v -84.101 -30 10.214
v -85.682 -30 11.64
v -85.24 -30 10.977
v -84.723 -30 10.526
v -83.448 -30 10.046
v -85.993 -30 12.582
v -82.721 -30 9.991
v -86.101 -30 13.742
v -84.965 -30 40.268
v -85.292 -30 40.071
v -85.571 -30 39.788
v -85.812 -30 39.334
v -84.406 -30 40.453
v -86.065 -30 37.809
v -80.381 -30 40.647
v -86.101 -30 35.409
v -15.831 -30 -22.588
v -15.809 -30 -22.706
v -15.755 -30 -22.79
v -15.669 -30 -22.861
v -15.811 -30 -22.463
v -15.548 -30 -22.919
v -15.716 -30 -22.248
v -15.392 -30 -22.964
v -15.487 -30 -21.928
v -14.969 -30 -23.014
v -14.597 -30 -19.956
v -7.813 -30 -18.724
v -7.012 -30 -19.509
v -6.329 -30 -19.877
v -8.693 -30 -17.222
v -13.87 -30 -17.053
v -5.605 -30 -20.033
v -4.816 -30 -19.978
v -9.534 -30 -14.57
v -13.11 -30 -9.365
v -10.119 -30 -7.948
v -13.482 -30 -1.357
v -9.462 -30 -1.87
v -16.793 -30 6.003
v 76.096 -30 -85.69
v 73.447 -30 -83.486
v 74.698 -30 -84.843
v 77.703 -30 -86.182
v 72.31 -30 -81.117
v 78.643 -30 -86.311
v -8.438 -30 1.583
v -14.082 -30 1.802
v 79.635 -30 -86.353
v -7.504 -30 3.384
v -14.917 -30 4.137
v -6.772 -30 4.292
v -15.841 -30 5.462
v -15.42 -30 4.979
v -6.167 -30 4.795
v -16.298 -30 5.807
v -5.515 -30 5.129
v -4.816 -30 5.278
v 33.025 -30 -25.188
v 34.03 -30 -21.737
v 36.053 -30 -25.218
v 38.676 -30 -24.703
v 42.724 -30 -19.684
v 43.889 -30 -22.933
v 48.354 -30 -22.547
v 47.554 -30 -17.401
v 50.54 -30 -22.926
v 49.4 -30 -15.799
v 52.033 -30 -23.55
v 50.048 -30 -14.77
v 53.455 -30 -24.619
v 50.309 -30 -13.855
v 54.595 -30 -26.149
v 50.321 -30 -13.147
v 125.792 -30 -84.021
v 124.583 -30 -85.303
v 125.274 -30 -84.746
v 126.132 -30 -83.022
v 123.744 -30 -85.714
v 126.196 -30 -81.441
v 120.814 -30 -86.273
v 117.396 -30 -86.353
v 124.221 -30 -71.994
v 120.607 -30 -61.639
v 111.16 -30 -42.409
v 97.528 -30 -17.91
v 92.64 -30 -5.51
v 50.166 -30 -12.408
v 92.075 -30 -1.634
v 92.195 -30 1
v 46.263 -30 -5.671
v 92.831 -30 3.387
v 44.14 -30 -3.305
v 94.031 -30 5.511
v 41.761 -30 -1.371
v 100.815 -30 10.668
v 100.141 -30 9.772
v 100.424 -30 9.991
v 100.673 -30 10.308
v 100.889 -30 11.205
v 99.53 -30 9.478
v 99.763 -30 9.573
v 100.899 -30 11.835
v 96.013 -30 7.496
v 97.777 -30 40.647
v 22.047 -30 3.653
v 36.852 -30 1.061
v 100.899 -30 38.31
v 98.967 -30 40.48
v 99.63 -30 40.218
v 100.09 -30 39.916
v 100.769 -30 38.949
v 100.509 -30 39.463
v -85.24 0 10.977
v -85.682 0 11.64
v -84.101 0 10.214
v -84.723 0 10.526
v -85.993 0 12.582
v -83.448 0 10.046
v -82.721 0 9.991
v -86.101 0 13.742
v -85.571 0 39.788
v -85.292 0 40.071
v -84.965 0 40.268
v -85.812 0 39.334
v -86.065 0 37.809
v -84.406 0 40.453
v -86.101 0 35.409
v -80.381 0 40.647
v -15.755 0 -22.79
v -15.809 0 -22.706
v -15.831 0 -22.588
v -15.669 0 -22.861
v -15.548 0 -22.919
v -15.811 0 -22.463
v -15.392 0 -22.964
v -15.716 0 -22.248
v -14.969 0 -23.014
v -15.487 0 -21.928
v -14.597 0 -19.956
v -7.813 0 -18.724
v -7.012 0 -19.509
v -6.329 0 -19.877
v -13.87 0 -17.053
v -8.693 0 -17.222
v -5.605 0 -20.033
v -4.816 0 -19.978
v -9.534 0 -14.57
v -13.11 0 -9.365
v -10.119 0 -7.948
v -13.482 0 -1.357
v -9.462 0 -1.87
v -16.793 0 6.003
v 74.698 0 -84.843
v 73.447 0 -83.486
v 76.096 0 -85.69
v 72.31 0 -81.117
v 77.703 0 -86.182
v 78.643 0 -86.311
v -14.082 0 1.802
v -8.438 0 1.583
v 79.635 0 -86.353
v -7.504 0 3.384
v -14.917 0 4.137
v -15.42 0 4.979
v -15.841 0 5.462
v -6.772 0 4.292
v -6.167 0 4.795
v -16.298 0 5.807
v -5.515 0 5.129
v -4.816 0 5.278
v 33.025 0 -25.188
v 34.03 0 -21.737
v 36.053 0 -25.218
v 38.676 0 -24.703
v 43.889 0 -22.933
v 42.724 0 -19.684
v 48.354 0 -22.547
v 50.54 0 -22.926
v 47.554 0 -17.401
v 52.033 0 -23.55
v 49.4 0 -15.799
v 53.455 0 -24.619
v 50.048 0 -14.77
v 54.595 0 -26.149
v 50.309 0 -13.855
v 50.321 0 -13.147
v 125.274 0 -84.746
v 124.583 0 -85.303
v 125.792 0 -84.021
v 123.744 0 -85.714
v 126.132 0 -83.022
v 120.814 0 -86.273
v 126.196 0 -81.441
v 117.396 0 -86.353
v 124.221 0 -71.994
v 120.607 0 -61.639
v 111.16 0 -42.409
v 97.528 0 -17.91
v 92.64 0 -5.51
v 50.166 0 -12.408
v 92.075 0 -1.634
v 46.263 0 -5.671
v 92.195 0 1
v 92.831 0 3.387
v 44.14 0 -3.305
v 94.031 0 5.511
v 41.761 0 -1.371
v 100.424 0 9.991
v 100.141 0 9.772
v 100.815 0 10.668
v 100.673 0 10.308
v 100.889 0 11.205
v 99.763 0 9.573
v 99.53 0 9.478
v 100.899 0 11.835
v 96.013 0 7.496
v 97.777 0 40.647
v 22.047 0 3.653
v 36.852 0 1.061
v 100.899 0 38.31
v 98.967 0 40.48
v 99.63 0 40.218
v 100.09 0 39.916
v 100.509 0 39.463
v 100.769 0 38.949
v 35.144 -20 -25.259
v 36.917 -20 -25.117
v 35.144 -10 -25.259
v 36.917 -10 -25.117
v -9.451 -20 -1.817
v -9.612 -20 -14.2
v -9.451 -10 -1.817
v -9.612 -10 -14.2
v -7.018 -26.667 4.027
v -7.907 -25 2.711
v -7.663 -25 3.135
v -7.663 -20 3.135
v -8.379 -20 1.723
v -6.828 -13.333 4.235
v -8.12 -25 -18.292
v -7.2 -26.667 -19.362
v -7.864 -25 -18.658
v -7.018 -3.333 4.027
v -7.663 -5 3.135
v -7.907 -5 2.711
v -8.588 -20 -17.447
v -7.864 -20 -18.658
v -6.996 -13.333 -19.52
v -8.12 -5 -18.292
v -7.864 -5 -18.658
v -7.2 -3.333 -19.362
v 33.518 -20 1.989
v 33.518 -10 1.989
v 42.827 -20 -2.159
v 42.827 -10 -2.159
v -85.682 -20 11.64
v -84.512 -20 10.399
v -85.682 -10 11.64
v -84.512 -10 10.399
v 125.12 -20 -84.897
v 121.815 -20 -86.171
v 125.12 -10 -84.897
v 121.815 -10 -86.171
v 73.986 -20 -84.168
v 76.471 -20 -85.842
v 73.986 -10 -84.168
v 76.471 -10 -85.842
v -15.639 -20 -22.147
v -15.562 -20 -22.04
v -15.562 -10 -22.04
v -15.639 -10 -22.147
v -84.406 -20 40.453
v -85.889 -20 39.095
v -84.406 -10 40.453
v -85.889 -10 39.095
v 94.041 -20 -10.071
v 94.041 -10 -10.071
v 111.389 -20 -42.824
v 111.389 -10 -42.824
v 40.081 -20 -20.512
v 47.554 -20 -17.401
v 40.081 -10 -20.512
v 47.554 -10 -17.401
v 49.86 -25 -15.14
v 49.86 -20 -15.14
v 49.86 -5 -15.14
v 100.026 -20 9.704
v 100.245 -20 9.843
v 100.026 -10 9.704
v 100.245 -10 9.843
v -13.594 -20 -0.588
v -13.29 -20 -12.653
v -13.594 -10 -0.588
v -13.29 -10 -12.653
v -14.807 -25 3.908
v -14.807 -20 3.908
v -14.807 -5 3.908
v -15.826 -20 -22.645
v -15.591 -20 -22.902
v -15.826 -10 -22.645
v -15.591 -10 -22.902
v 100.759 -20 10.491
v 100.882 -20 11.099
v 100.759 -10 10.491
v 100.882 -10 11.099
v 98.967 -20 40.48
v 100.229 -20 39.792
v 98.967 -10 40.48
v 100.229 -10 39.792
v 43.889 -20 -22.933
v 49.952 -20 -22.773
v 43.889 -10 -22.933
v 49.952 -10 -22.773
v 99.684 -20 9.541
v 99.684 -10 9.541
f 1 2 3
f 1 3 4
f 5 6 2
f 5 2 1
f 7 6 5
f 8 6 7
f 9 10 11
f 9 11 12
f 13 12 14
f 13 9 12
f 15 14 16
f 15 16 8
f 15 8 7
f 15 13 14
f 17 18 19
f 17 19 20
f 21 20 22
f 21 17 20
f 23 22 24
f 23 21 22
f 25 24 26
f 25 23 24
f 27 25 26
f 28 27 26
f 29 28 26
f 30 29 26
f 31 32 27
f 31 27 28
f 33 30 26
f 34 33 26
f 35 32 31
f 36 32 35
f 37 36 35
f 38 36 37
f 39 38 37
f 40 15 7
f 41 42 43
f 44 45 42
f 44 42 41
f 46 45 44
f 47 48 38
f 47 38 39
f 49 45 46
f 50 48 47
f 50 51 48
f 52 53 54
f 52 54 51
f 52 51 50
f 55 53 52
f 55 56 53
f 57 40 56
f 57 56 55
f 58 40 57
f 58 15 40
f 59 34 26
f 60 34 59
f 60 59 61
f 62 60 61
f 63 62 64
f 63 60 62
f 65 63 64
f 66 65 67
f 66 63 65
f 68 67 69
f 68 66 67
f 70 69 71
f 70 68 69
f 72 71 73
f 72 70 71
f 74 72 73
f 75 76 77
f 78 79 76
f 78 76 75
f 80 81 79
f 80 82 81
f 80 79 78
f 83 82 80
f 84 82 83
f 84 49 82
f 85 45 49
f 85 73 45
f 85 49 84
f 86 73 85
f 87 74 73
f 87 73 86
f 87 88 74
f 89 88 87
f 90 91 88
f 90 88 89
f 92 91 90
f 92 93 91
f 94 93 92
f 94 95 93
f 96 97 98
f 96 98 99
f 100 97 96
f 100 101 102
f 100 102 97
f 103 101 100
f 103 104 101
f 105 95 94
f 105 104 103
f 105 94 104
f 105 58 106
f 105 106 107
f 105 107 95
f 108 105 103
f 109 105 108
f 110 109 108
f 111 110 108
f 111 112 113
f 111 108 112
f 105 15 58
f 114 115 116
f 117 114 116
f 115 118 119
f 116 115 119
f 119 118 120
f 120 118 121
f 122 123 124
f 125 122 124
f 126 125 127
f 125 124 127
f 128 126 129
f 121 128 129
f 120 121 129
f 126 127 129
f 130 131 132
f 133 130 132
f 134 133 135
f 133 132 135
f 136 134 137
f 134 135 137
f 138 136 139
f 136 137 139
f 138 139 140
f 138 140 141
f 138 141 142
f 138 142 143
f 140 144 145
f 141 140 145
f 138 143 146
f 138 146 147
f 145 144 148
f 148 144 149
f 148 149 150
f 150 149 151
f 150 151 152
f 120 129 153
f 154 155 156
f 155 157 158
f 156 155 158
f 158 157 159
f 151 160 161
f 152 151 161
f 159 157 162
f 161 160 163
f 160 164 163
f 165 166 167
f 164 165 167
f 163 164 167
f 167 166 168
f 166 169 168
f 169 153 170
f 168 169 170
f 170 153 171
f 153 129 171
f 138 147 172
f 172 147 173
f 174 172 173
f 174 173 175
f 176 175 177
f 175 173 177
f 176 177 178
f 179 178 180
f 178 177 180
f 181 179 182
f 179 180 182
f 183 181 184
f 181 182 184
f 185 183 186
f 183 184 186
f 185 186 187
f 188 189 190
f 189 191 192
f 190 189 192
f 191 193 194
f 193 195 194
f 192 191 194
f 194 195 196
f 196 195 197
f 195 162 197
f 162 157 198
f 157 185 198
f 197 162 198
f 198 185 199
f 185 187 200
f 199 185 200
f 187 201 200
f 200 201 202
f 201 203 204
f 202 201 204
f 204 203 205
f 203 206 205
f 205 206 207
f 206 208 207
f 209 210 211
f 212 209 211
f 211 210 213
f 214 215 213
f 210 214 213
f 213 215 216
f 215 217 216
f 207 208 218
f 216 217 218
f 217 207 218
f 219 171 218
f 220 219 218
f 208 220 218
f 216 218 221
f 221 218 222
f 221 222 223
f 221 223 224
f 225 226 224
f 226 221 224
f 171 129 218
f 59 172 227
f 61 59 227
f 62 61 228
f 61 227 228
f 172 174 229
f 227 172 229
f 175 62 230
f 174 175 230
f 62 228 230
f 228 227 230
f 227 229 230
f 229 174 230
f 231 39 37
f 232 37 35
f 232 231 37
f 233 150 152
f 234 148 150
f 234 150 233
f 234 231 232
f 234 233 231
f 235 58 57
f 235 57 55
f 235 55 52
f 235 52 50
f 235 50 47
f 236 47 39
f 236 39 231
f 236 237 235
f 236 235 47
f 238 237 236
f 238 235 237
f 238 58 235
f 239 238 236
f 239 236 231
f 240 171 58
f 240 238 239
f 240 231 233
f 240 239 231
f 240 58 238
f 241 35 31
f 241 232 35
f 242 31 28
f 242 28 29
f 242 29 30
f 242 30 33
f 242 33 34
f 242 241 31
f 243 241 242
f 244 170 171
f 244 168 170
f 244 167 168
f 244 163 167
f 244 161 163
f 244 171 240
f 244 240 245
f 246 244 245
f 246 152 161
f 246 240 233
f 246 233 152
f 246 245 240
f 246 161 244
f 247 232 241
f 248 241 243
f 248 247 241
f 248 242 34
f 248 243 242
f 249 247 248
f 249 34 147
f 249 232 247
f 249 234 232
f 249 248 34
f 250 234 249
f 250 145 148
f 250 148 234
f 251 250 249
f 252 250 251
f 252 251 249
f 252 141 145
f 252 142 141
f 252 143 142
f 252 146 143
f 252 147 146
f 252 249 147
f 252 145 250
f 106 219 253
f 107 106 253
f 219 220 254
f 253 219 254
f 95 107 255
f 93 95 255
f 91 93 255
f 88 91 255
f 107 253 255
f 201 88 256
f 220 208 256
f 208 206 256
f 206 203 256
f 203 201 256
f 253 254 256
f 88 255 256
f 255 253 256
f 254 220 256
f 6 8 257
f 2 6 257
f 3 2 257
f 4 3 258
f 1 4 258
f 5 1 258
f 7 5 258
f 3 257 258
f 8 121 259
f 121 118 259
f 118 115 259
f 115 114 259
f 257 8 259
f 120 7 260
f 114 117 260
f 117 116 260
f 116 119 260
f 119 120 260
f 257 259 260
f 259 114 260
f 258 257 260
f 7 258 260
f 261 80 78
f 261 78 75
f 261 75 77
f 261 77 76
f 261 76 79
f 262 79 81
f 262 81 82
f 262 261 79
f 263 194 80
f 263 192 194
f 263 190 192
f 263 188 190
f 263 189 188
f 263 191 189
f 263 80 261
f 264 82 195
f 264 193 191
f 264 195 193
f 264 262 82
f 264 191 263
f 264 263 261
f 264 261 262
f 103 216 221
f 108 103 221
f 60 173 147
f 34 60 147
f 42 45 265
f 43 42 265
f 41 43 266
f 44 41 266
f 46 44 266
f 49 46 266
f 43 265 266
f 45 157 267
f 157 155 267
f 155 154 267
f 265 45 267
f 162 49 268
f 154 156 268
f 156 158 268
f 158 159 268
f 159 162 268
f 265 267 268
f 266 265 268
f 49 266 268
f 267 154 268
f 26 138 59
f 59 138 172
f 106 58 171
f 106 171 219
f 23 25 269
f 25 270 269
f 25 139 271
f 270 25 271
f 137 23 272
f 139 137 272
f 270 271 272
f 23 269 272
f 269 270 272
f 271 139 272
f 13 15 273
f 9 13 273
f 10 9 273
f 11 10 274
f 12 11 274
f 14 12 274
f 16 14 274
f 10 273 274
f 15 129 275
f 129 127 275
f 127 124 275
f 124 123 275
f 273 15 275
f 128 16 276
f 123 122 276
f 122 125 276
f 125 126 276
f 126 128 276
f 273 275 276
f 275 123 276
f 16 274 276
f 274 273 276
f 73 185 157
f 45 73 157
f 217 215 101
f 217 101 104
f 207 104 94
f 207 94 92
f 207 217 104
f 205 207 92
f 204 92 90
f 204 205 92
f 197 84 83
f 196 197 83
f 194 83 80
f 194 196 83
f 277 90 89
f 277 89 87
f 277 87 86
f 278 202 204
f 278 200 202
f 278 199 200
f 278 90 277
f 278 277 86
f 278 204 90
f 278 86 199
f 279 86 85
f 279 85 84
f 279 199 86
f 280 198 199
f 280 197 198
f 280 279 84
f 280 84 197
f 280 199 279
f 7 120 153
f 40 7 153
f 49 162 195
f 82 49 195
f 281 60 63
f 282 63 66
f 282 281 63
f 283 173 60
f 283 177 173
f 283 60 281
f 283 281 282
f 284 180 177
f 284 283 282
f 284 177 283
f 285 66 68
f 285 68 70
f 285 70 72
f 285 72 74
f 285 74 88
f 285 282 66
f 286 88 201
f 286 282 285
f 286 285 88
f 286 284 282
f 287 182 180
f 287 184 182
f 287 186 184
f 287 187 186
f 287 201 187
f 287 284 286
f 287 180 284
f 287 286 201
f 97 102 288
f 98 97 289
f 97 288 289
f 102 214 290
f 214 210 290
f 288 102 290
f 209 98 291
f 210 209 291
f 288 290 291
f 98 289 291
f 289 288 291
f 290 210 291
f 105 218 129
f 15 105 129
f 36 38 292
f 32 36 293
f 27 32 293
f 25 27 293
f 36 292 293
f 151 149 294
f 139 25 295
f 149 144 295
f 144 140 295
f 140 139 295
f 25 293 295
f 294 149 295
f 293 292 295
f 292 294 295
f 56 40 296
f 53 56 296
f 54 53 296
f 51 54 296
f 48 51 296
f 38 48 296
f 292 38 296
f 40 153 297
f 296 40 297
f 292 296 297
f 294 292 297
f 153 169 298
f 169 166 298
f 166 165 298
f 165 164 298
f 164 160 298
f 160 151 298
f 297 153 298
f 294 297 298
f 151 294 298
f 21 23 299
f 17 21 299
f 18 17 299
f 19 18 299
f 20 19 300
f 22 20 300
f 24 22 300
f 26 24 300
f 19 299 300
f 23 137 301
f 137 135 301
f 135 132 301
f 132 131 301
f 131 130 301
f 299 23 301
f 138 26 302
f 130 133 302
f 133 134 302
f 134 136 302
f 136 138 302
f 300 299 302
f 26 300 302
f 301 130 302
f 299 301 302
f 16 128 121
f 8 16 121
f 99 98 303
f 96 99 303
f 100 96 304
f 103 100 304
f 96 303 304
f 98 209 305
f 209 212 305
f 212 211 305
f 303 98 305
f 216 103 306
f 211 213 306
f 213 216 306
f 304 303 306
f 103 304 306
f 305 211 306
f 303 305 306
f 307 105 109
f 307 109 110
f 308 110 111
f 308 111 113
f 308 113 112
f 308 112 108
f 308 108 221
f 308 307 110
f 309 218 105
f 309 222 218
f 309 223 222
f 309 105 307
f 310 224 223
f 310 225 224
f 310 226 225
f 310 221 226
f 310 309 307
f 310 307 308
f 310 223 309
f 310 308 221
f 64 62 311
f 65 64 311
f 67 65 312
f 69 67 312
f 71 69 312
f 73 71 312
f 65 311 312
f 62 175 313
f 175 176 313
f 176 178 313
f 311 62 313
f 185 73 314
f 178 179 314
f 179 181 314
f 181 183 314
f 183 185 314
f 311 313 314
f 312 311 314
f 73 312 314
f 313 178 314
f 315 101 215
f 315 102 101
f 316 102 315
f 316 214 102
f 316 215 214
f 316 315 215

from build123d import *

# Parameters (mm, degrees)
F1_DEPTH = 30


with BuildPart() as f1:
    # F0 (on Front) → F1 (new body)
    with BuildSketch(Plane.XZ):
        with BuildLine():
            Line((97.776912, 40.647307), (-80.380566, 40.647307))
            add(Edge.make_bspline(
                [(-80.380566, 40.647307), (-86.100639, 40.647307), (-86.100639, 40.647307), (-86.100639, 35.409246)],
                knots=[0, 0, 0, 0, 7.756063, 7.756063, 7.756063, 7.756063], degree=3))
            Line((-86.100639, 35.409246), (-86.100639, 23.107393))
            Line((-86.100639, 23.107393), (-86.100639, 13.742078))
            add(Edge.make_bspline(
                [(-86.100639, 13.742078), (-86.100639, 11.200923), (-84.778505, 9.990849), (-82.721377, 9.990849)],
                knots=[0, 0, 0, 0, 5.048874, 5.048874, 5.048874, 5.048874], degree=3))
            Line((-82.721377, 9.990849), (42.946892, 9.990849))
            Line((42.946892, 9.990849), (100.42418, 9.990849))
            add(Edge.make_bspline(
                [(100.42418, 9.990849), (100.899361, 10.444165), (100.899361, 11.027312), (100.899361, 11.835068)],
                knots=[0.810614, 0.810614, 0.810614, 0.810614, 2.726205, 2.726205, 2.726205, 2.726205], degree=3))
            Line((100.899361, 11.835068), (100.899361, 37.817217))
            Line((100.899361, 37.817217), (100.899361, 38.309757))
            add(Edge.make_bspline(
                [(97.776912, 40.647307), (98.709423, 40.647307), (100.746087, 40.282354), (100.899361, 38.309757)],
                knots=[0, 0, 0, 0, 3.908681, 3.908681, 3.908681, 3.908681], degree=3))
        make_face()
        with BuildLine():
            Line((42.946892, 9.990849), (-82.721377, 9.990849))
            Line((-82.721377, 9.990849), (-16.793105, 6.002678))
            Line((-16.793105, 6.002678), (-4.816184, 5.278163))
            Line((-4.816184, 5.278163), (22.046749, 3.653155))
            add(Edge.make_bspline(
                [(22.046749, 3.653155), (34.664334, 2.02508), (43.747929, 2.097842), (50.165818, -12.407815)],
                knots=[0, 0, 0, 0, 32.382662, 32.382662, 32.382662, 32.382662], degree=3))
            Line((50.165818, -12.407815), (42.946892, 9.990849))
        make_face()
        with BuildLine():
            add(Edge.make_bspline(
                [(99.762504, 9.572628), (100.049352, 9.699678), (100.263823, 9.837871), (100.42418, 9.990849)],
                knots=[0.164171, 0.164171, 0.164171, 0.164171, 0.810614, 0.810614, 0.810614, 0.810614], degree=3))
            Line((100.42418, 9.990849), (42.946892, 9.990849))
            Line((42.946892, 9.990849), (50.165818, -12.407815))
            Line((50.165818, -12.407815), (54.594625, -26.149378))
            Line((54.594625, -26.149378), (72.310335, -81.117139))
            add(Edge.make_bspline(
                [(72.310335, -81.117139), (73.538602, -84.92817), (76.174926, -86.352693), (79.634588, -86.352693)],
                knots=[0, 0, 0, 0, 9.003094, 9.003094, 9.003094, 9.003094], degree=3))
            Line((79.634588, -86.352693), (117.39595, -86.352693))
            add(Edge.make_bspline(
                [(126.196032, -81.440722), (126.605711, -86.352693), (122.000841, -86.352693), (117.39595, -86.352693)],
                knots=[0, 0, 0, 0, 10.07814, 10.07814, 10.07814, 10.07814], degree=3))
            add(Edge.make_bspline(
                [(99.529658, 9.477928), (74.162825, -1.021876), (121.11838, -42.338561), (126.196032, -81.440722)],
                knots=[1.614811, 1.614811, 1.614811, 1.614811, 95.760536, 95.760536, 95.760536, 95.760536], degree=3))
            add(Edge.make_bspline(
                [(99.762504, 9.572628), (99.684221, 9.541346), (99.606607, 9.509779), (99.529658, 9.477928)],
                knots=[1.329225, 1.329225, 1.329225, 1.329225, 1.614811, 1.614811, 1.614811, 1.614811], degree=3))
        make_face()
        with BuildLine():
            Line((-4.816184, 5.278163), (-16.793105, 6.002678))
            add(Edge.make_bspline(
                [(-16.793105, 6.002678), (-12.01583, 4.90427), (-12.169383, -16.80378), (-15.487377, -21.927638)],
                knots=[0, 0, 0, 0, 26.254366, 26.254366, 26.254366, 26.254366], degree=3))
            add(Edge.make_bspline(
                [(-15.487377, -21.927638), (-15.561956, -22.042808), (-15.638135, -22.1496), (-15.715892, -22.247591)],
                knots=[26.254366, 26.254366, 26.254366, 26.254366, 26.844495, 26.844495, 26.844495, 26.844495], degree=3))
            add(Edge.make_bspline(
                [(-15.715892, -22.247591), (-15.984637, -22.712274), (-15.798589, -22.976652), (-14.969375, -23.014201)],
                knots=[0.209384, 0.209384, 0.209384, 0.209384, 1.203722, 1.203722, 1.203722, 1.203722], degree=3))
            Line((-14.969375, -23.014201), (33.024817, -25.187522))
            add(Edge.make_bspline(
                [(33.024817, -25.187522), (35.429672, -25.345404), (36.811816, -25.272874), (38.675787, -24.702951)],
                knots=[0, 0, 0, 0, 5.671708, 5.671708, 5.671708, 5.671708], degree=3))
            add(Edge.make_bspline(
                [(38.675787, -24.702951), (42.706189, -22.769051), (51.420407, -20.362724), (54.594625, -26.149378)],
                knots=[1.903191, 1.903191, 1.903191, 1.903191, 17.202754, 17.202754, 17.202754, 17.202754], degree=3))
            Line((54.594625, -26.149378), (50.165818, -12.407815))
            add(Edge.make_bspline(
                [(34.029736, -21.737423), (37.275825, -21.454684), (52.078497, -18.342414), (50.165818, -12.407815)],
                knots=[0, 0, 0, 0, 18.639065, 18.639065, 18.639065, 18.639065], degree=3))
            Line((34.029736, -21.737423), (-4.816184, -19.978363))
            add(Edge.make_bspline(
                [(-4.816184, 5.278163), (-11.526522, 4.791767), (-12.252566, -21.466842), (-4.816184, -19.978363)],
                knots=[0, 0, 0, 0, 25.256526, 25.256526, 25.256526, 25.256526], degree=3))
        make_face()
    extrude(amount=F1_DEPTH)


solid = f1.part
